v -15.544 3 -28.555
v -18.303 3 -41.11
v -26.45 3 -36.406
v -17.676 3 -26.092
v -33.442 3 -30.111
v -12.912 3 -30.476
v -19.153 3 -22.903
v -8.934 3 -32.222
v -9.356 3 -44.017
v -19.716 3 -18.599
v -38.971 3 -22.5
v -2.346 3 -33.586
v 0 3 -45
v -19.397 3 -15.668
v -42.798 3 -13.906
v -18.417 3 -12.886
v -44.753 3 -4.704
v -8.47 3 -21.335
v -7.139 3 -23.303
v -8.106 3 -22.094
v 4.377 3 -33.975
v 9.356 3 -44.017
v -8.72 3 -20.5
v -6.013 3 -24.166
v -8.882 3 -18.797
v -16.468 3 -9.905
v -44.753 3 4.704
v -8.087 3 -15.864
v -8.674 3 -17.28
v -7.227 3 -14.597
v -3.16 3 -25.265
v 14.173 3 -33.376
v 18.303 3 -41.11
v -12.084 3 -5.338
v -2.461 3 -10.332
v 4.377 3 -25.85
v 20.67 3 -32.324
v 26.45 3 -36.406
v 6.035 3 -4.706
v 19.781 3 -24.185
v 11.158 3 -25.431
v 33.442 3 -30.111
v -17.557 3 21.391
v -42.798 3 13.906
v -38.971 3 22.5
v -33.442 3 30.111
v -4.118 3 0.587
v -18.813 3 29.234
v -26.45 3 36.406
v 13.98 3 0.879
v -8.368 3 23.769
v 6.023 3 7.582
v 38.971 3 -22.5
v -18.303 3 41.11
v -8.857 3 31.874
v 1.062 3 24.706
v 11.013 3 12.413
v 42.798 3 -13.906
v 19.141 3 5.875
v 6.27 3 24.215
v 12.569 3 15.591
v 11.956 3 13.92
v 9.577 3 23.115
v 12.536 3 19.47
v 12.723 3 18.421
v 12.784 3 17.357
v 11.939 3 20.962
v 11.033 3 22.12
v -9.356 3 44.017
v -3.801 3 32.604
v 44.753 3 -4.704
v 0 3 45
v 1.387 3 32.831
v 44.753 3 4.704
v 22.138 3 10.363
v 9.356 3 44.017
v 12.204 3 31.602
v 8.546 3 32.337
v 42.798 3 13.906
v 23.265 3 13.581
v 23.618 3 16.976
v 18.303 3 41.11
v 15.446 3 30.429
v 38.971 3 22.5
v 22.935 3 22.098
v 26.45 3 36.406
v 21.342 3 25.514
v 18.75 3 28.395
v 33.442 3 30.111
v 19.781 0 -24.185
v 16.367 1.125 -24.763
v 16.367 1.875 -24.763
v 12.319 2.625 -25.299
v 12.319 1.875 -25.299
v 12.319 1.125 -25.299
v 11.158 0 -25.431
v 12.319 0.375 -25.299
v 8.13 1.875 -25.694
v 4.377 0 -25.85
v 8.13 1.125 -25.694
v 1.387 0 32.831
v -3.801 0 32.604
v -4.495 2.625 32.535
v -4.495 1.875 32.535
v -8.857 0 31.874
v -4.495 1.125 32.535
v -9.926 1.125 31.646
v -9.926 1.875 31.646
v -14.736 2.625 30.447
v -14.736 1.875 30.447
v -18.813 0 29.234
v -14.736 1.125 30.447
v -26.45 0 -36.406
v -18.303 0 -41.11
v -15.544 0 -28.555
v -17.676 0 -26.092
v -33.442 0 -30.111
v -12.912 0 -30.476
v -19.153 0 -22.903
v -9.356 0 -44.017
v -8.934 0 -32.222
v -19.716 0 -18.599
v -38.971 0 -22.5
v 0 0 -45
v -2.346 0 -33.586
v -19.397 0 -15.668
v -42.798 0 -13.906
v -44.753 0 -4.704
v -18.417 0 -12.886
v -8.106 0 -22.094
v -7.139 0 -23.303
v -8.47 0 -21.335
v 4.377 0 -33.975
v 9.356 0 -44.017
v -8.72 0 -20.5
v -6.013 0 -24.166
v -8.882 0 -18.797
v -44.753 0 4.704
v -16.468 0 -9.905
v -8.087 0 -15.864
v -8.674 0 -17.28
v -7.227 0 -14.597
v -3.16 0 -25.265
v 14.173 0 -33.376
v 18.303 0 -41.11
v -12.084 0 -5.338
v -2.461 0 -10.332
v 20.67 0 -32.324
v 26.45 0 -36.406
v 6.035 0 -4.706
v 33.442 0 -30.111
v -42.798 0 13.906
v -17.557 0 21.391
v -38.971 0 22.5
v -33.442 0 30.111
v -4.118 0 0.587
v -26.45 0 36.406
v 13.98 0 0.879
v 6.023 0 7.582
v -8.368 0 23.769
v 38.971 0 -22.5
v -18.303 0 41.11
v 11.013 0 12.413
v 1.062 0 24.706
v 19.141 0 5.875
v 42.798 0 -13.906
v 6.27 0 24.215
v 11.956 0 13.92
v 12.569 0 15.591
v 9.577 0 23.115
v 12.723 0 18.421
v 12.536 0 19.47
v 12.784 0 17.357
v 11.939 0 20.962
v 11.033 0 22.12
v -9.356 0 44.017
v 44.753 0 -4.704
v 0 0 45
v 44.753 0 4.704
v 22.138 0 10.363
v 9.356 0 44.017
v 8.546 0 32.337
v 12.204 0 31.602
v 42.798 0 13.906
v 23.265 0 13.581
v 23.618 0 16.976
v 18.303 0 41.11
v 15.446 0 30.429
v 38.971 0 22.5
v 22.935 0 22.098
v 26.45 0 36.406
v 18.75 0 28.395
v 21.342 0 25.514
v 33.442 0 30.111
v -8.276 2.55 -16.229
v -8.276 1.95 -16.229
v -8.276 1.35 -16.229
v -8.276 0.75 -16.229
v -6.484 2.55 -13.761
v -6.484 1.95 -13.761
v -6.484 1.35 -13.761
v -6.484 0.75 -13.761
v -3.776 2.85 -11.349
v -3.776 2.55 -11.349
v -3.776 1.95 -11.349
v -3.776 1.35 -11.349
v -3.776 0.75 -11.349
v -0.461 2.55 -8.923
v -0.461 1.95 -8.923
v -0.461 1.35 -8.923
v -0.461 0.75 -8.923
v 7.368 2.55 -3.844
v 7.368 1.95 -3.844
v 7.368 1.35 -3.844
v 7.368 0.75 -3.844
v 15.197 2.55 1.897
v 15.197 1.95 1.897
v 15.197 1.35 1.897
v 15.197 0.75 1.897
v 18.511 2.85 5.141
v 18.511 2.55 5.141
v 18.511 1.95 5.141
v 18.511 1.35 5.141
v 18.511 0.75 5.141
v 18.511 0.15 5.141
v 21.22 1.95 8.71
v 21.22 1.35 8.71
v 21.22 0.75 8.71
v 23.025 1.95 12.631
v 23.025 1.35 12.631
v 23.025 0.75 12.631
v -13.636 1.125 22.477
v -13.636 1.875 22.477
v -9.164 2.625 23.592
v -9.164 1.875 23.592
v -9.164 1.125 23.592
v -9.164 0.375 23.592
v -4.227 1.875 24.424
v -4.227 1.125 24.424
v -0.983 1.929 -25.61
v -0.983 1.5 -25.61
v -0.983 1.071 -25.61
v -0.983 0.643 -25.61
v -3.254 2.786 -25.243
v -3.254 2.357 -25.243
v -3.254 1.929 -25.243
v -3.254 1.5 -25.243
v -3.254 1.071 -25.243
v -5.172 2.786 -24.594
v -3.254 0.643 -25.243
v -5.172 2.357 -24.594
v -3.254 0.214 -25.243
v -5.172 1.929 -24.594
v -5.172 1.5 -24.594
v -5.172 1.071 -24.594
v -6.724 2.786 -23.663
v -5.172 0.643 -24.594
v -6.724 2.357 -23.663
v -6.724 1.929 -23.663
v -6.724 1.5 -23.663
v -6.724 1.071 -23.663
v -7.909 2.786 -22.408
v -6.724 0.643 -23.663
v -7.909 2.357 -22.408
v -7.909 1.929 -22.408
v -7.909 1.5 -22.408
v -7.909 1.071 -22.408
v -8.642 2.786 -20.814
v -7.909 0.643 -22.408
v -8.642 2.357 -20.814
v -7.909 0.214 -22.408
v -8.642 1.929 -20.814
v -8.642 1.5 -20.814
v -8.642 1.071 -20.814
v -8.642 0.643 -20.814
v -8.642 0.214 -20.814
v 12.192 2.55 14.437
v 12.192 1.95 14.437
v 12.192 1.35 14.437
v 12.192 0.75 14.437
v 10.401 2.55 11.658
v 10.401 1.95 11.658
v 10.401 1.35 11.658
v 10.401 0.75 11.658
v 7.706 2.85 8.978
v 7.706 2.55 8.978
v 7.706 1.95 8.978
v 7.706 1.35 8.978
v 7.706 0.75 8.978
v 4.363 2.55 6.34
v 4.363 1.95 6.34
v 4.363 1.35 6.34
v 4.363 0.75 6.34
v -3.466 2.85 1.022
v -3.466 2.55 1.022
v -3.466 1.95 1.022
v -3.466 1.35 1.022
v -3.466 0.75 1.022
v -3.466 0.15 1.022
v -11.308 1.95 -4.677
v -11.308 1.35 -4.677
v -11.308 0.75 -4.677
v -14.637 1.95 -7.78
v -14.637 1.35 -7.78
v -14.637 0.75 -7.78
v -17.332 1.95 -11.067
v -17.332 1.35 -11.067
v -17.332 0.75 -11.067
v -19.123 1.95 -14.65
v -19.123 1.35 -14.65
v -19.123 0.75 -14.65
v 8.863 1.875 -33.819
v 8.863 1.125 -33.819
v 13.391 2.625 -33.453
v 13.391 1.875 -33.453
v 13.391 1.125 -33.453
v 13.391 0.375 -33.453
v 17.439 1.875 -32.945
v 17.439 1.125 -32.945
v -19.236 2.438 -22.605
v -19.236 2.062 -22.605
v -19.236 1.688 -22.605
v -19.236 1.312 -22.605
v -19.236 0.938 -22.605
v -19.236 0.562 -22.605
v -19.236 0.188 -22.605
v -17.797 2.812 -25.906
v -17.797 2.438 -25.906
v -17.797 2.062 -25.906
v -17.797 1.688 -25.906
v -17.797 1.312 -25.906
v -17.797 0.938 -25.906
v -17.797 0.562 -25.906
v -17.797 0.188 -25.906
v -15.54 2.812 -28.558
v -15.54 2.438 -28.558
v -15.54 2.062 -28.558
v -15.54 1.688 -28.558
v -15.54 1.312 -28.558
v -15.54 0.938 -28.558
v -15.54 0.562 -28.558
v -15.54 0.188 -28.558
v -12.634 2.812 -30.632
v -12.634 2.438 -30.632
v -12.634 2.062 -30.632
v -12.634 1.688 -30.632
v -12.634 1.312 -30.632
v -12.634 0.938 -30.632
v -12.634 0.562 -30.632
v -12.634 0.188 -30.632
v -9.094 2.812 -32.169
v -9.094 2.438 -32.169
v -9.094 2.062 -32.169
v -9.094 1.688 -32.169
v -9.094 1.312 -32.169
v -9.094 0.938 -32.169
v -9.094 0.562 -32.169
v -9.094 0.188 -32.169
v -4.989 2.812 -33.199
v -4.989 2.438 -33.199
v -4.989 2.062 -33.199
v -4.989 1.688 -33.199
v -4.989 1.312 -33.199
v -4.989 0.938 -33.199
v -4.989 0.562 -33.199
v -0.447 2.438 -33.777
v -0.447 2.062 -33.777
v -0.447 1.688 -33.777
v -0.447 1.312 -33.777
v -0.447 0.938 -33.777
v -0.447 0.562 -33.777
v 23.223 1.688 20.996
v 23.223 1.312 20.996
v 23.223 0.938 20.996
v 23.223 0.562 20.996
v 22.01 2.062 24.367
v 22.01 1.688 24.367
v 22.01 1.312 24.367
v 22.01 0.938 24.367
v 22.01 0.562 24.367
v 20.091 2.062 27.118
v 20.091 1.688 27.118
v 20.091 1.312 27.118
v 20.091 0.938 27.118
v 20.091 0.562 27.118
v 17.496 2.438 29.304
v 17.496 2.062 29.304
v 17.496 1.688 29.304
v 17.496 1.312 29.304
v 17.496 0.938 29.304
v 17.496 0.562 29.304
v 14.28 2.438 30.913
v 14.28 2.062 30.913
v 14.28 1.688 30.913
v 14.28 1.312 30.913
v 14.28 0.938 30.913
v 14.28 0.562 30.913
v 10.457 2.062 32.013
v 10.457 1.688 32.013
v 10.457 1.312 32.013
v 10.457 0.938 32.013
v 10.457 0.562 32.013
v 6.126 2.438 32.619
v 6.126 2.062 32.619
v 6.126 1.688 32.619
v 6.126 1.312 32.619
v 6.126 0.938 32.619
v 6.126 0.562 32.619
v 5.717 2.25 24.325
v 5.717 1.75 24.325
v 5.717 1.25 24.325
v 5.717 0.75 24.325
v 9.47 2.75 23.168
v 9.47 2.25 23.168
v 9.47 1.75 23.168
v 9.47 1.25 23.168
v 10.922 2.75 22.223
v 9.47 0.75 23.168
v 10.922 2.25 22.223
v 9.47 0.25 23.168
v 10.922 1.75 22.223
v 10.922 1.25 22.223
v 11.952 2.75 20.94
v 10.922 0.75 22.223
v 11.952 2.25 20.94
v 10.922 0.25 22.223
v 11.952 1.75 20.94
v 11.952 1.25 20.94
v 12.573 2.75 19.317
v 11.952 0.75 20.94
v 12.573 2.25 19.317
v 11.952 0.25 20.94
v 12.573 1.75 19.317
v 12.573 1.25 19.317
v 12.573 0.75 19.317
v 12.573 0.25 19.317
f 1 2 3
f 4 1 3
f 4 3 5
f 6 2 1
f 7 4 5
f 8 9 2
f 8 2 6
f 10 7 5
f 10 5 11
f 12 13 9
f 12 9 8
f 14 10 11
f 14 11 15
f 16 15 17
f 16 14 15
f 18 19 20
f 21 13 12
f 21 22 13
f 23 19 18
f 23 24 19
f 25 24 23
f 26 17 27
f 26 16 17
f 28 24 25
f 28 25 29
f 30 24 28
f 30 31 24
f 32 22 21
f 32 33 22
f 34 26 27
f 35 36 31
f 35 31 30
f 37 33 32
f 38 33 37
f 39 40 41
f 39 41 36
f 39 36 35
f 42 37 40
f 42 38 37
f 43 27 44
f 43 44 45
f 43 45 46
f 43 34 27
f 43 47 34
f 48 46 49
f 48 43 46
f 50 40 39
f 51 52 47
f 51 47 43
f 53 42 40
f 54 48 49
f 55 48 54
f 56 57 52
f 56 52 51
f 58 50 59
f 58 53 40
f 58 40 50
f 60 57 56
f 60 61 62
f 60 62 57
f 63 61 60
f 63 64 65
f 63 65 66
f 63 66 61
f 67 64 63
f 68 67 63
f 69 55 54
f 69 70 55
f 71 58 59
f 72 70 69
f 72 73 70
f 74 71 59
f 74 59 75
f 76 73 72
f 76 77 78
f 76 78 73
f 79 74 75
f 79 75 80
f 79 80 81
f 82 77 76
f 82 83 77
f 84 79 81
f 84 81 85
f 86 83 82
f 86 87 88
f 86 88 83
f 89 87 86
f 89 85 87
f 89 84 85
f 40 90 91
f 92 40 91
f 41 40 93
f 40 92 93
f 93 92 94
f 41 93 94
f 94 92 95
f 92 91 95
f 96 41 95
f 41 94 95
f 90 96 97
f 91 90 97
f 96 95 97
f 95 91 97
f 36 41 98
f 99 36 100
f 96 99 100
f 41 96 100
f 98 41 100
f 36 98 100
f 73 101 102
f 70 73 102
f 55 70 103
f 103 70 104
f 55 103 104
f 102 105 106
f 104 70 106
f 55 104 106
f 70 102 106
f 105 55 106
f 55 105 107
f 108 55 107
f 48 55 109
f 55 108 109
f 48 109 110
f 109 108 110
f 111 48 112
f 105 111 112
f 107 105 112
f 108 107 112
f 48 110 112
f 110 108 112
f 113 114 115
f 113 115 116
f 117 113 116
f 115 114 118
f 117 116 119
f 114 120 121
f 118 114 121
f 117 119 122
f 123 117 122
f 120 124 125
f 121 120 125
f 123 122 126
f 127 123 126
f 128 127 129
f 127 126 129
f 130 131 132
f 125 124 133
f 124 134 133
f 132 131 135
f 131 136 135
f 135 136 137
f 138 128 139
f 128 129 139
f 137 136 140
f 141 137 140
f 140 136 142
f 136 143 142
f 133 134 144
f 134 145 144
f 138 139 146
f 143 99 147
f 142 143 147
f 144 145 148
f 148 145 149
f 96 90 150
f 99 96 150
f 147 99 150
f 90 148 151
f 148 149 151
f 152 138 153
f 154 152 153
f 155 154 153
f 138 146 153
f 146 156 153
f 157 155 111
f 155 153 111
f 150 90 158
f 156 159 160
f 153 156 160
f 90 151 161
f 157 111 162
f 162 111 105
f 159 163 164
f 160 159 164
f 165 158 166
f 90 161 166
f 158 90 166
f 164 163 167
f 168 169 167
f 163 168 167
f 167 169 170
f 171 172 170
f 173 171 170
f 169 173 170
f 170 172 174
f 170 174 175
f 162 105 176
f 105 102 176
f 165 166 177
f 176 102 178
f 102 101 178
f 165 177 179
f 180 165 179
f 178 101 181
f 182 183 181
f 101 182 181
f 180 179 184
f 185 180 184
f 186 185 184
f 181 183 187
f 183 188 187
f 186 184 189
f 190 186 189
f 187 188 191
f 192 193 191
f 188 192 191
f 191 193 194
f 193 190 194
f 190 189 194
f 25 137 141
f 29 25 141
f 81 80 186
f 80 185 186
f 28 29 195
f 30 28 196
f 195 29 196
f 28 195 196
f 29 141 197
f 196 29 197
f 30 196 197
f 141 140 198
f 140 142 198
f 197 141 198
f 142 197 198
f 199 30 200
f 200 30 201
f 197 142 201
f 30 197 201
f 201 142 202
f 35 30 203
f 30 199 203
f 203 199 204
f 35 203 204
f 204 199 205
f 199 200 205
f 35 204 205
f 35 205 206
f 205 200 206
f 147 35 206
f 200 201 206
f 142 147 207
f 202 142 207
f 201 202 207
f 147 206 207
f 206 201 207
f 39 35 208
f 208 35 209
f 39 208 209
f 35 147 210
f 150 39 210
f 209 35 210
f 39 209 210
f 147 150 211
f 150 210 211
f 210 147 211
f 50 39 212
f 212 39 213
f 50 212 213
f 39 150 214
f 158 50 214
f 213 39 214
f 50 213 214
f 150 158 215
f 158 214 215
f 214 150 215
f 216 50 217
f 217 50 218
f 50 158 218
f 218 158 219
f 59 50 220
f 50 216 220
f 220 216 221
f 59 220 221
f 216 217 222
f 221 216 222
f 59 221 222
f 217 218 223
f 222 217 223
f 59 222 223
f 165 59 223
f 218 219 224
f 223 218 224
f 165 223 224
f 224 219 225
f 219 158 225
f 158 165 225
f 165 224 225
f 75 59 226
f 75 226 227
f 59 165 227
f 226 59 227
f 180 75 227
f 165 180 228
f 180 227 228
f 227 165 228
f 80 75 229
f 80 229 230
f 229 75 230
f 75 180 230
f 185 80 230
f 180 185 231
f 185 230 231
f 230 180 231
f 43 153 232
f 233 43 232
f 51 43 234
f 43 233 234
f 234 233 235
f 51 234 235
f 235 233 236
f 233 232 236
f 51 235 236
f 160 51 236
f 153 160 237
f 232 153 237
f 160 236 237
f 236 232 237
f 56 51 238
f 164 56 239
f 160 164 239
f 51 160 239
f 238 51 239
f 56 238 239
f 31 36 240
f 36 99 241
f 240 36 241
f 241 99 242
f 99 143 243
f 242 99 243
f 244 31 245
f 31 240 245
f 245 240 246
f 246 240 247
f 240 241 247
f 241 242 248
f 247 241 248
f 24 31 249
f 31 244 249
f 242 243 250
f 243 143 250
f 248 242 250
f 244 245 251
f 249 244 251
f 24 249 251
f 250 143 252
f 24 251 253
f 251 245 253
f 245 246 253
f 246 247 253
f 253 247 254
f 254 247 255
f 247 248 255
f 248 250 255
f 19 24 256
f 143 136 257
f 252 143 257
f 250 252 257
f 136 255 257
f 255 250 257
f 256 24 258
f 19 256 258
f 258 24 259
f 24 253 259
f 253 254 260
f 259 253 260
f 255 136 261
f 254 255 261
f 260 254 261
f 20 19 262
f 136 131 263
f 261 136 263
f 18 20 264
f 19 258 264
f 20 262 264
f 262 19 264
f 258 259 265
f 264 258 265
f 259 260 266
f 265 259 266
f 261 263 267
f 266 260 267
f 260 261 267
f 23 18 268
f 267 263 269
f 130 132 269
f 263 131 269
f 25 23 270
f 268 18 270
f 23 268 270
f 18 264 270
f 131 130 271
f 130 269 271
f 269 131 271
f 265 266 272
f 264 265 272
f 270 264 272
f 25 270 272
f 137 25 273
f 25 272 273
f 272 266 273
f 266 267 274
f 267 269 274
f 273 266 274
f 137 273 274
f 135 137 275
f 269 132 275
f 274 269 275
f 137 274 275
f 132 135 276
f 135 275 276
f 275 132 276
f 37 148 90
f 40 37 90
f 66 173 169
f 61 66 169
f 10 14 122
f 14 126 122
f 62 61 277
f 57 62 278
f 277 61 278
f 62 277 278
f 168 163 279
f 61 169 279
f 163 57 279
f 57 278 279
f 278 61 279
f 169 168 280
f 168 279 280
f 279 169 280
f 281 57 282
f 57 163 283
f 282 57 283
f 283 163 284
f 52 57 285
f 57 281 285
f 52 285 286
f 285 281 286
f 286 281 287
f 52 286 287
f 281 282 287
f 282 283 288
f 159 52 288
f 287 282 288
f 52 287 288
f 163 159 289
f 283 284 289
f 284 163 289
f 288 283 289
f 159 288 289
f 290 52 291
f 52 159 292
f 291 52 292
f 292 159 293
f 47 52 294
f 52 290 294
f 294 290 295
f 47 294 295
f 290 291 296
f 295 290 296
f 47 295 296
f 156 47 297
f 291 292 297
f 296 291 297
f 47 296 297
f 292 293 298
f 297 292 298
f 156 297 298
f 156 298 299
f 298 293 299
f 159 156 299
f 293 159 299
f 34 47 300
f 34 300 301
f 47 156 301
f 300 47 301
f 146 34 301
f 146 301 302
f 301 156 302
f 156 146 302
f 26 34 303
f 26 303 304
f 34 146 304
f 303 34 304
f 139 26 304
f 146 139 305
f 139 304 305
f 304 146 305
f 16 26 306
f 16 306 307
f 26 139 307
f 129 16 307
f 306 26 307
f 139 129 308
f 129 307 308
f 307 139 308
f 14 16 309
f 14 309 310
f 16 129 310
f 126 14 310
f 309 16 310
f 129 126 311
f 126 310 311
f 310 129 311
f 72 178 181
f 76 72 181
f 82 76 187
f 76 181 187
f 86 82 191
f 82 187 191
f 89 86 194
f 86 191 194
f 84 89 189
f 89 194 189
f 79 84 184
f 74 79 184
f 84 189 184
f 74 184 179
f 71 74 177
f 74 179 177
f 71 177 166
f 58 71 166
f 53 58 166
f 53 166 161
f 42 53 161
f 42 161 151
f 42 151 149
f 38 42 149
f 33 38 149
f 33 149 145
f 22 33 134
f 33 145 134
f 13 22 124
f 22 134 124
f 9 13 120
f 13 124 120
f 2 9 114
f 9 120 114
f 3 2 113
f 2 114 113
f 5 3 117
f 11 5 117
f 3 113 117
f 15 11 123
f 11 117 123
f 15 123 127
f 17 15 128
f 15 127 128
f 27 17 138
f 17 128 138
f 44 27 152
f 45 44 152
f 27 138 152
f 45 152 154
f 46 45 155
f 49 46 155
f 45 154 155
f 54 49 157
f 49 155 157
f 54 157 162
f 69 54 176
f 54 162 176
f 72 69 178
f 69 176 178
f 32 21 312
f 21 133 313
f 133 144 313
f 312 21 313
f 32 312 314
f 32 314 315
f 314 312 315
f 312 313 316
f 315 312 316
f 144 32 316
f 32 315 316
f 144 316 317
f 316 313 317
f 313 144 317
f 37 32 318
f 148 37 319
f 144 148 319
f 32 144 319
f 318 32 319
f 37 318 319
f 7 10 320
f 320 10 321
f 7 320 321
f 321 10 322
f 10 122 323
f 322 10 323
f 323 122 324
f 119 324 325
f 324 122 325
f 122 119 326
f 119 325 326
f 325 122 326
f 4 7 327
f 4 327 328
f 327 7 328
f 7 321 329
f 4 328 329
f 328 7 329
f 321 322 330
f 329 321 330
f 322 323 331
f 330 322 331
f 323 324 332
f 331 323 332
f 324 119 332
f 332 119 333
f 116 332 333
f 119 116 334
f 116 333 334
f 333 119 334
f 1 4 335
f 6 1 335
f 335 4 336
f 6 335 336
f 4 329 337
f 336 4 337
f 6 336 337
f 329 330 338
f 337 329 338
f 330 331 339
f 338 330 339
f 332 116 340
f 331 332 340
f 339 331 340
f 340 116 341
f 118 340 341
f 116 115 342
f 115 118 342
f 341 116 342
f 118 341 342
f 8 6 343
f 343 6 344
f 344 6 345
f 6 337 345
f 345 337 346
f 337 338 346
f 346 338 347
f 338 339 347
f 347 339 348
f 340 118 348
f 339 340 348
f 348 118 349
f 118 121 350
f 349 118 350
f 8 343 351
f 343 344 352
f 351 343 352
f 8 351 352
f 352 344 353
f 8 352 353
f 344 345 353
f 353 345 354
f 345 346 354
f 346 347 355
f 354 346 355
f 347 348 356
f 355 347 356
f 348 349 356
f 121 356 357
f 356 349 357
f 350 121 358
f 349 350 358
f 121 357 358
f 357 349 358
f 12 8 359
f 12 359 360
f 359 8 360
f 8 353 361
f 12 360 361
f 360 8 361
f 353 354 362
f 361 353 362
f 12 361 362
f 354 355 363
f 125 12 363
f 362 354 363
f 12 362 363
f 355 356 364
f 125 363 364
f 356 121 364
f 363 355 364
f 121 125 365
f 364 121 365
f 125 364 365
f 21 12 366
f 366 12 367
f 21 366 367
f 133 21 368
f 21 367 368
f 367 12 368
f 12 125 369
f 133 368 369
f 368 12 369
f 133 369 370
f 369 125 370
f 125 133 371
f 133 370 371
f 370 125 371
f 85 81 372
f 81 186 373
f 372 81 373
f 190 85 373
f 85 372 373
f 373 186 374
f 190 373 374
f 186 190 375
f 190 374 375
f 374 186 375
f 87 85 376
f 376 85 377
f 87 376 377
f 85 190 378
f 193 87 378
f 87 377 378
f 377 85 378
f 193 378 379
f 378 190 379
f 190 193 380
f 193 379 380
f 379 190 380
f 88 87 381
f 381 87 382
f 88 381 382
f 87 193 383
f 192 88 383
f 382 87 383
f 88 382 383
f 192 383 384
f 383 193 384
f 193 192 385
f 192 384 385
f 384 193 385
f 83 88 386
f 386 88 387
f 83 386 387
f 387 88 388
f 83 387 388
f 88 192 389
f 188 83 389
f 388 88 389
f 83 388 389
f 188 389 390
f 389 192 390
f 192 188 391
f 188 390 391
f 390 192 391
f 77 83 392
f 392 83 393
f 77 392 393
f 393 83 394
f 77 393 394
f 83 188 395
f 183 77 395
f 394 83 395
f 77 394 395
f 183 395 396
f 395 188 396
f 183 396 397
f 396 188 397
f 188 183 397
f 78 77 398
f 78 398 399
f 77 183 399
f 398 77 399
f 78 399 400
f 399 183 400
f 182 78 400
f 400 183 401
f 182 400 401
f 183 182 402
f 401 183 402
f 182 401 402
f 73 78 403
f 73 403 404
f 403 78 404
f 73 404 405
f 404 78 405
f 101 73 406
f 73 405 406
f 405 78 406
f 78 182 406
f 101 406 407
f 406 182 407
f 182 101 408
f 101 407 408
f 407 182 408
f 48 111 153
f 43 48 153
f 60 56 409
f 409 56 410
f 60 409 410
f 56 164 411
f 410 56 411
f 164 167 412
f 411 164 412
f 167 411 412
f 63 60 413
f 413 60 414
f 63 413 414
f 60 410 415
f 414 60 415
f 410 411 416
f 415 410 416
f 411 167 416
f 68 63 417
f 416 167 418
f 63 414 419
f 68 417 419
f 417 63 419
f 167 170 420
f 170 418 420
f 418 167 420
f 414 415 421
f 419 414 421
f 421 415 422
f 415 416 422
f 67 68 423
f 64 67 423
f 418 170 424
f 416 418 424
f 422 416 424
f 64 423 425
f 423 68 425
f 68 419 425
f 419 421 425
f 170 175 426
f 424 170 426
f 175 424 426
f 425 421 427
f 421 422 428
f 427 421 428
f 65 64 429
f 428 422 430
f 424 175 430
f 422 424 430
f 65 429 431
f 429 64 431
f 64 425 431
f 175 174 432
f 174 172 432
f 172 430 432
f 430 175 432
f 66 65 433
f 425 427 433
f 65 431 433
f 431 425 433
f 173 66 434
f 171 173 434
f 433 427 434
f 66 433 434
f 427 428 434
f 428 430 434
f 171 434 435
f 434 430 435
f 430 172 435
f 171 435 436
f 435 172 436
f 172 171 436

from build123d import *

# Parameters (mm, degrees)
SKETCH1_R           = 45
BOSS_EXTRUDE1_DEPTH = 3


with BuildPart() as part:
    # Sketch1 → Boss-Extrude1 (new body)
    with BuildSketch(Plane(origin=(0, 0, 0), x_dir=(1, 0, 0), z_dir=(0, 1, 0))):
        with Locations(Location((0, 0, 0), (0, 0, 270))):  # turned: the seam where the file's is
            Circle(SKETCH1_R)
        with BuildLine():
            add(Edge.make_bspline(
                [(19.780990946, 24.185124764), (19.255065107, 24.287914798), (18.122086305, 24.509350826), (16.316551627, 24.770179957), (14.357752418, 25.057330128), (12.311058297, 25.302832973), (10.229567608, 25.537930243), (8.173301101, 25.696077882), (6.221913509, 25.819266557), (4.969956895, 25.839869106), (4.377345112, 25.849621292)],
                knots=[0, 0, 0, 0, 0.829036243, 1.785956155, 2.822045536, 3.89228551, 4.975307857, 6.062841547, 7.083048955, 8, 8, 8, 8], degree=3))
            add(Edge.make_bspline(
                [(4.377345112, 25.849621292), (3.446204146, 25.839565028), (1.65716034, 25.820243466), (-0.523497459, 25.678422406), (-2.134814502, 25.466621363), (-3.234258723, 25.269743374), (-4.239722547, 24.96405185), (-5.163089497, 24.614993657), (-6.002431575, 24.201660489), (-6.733506828, 23.675895663), (-7.383141898, 23.092997796), (-7.930081052, 22.419543279), (-8.359935091, 21.657367799), (-8.673790899, 20.796588784), (-8.856015855, 19.829357364), (-8.873240581, 19.150114951), (-8.882203499, 18.796669903)],
                knots=[0, 0, 0, 0, 2.295489194, 4.410428573, 5.380894891, 6.301560079, 7.159764947, 7.966985716, 8.734184816, 9.457764993, 10.179765198, 10.880326743, 11.586237622, 12.32697511, 13.129438398, 14, 14, 14, 14], degree=3))
            add(Edge.make_bspline(
                [(-8.882203499, 18.796669903), (-8.850818027, 18.360202528), (-8.787076829, 17.473774773), (-8.299529285, 16.177773231), (-7.531705877, 14.918174723), (-6.468835972, 13.707430879), (-5.199588079, 12.505820488), (-3.750460779, 11.316874284), (-2.173501164, 10.095772106), (0.19047217, 8.465461016), (3.392591141, 6.389097084), (7.401158074, 3.84423487), (11.436980484, 1.154437496), (14.598547163, -1.337138932), (16.941188197, -3.441782617), (18.524295541, -5.116615111), (19.962389169, -6.861115679), (21.249269366, -8.677300905), (22.30079899, -10.59536019), (23.087128729, -12.62347507), (23.521482235, -14.771077168), (23.585470219, -16.235887567), (23.617796501, -16.975899541)],
                knots=[0, 0, 0, 0, 0.519213468, 1.054477964, 1.630134935, 2.270161266, 2.967727746, 3.71175636, 4.503051278, 5.34407491, 7.13300234, 9.051150551, 11.003302341, 12.910294161, 13.842483047, 14.754150315, 15.653890787, 16.535313878, 17.40293064, 18.254252337, 19.118060482, 20, 20, 20, 20], degree=3))
            add(Edge.make_bspline(
                [(23.617796501, -16.975899541), (23.599786365, -17.672825423), (23.564928796, -19.021684862), (23.270802134, -20.965503255), (22.762650283, -22.748577872), (22.050483541, -24.36572214), (21.174041496, -25.835244154), (20.110888209, -27.14506), (18.897414426, -28.327096204), (17.50009469, -29.336609406), (15.962883146, -30.226180167), (14.258614821, -30.943249705), (12.420117395, -31.575353637), (10.428945987, -32.043245685), (8.315670511, -32.386430983), (6.098422851, -32.63922249), (3.77777338, -32.797342644), (2.195888092, -32.819567974), (1.386893723, -32.830934264)],
                knots=[0, 0, 0, 0, 1.075194104, 2.080975546, 3.024934148, 3.928271024, 4.800677613, 5.657461563, 6.524782954, 7.407242198, 8.310928775, 9.259978089, 10.255920614, 11.308444205, 12.411965724, 13.558733007, 14.751507922, 16, 16, 16, 16], degree=3))
            add(Edge.make_bspline(
                [(1.386893723, -32.830934264), (0.384854835, -32.819567929), (-1.579565413, -32.797285102), (-4.469689043, -32.557780783), (-7.246791058, -32.207577643), (-9.885005378, -31.670272649), (-12.368606742, -31.076733402), (-14.681000089, -30.469055859), (-16.813387105, -29.868409154), (-18.164915503, -29.439515535), (-18.812759054, -29.233929055)],
                knots=[0, 0, 0, 0, 1.166641361, 2.287110747, 3.375174177, 4.42434953, 5.420457035, 6.34882319, 7.208522552, 8, 8, 8, 8], degree=3))
            Line((-18.812759054, -29.233929055), (-17.557333707, -21.391047111))
            add(Edge.make_bspline(
                [(-17.557333707, -21.391047111), (-16.92765023, -21.571066227), (-15.623509008, -21.943904896), (-13.597987784, -22.494044975), (-11.428021788, -23.040422446), (-9.137280734, -23.613361679), (-6.72469763, -24.121615317), (-4.205720245, -24.443757714), (-1.60294269, -24.668864111), (0.163871673, -24.693436806), (1.062457959, -24.705934264)],
                knots=[0, 0, 0, 0, 0.82784923, 1.714563499, 2.653014331, 3.656340952, 4.699592855, 5.767128945, 6.864381369, 8, 8, 8, 8], degree=3))
            add(Edge.make_bspline(
                [(1.062457959, -24.705934264), (1.876650637, -24.687246807), (3.435097114, -24.651477141), (5.663708681, -24.375253087), (7.66548934, -23.896733066), (9.185584763, -23.345151534), (10.24171498, -22.753709402), (10.937316717, -22.248785046), (11.499265321, -21.629257743), (11.979043163, -20.941428467), (12.342776891, -20.163357249), (12.596885499, -19.297650342), (12.751136892, -18.354355508), (12.773133718, -17.695897336), (12.784463168, -17.356758916)],
                knots=[0, 0, 0, 0, 1.865164993, 3.57011294, 5.132569067, 6.57499646, 7.255114939, 7.901464084, 8.534112646, 9.161604161, 9.81695743, 10.491765748, 11.223185006, 12, 12, 12, 12], degree=3))
            add(Edge.make_bspline(
                [(12.784463168, -17.356758916), (12.752373418, -16.859917427), (12.687880197, -15.861377146), (12.224204459, -14.388468451), (11.462465357, -12.964292087), (10.390925154, -11.60553121), (9.124414869, -10.267841999), (7.686118718, -8.936597872), (6.095227969, -7.612559939), (3.717571546, -5.85406476), (0.52885577, -3.635742908), (-3.489713573, -1.025376634), (-7.505368863, 1.697395276), (-10.696639338, 4.119771578), (-13.043162038, 6.168454152), (-14.637770832, 7.740654265), (-16.064077212, 9.372166101), (-17.348452609, 11.025867113), (-18.42180964, 12.766347784), (-19.168862671, 14.625642809), (-19.624536603, 16.58376369), (-19.684854205, 17.919645128), (-19.715536832, 18.599187264)],
                knots=[0, 0, 0, 0, 0.591380666, 1.188542884, 1.822507787, 2.505918877, 3.243027329, 4.015898054, 4.839248524, 5.707487546, 7.538026587, 9.466039613, 11.415971731, 13.317280673, 14.234172866, 15.125381555, 15.982728632, 16.814024653, 17.618094752, 18.409678073, 19.191027939, 20, 20, 20, 20], degree=3))
            add(Edge.make_bspline(
                [(-19.715536832, 18.599187264), (-19.69007572, 19.296431103), (-19.640869758, 20.643919536), (-19.294531368, 22.582084159), (-18.679144546, 24.338232741), (-17.842869563, 25.923663704), (-16.779110741, 27.326321286), (-15.558622534, 28.586881396), (-14.182283058, 29.714351392), (-12.623789919, 30.673268851), (-10.917968821, 31.496846545), (-9.069476595, 32.208414475), (-7.081002803, 32.779480609), (-4.958515074, 33.227140213), (-2.733752509, 33.556420942), (-0.422428367, 33.79150112), (1.95338712, 33.958539874), (3.563608319, 33.969222666), (4.377345112, 33.974621292)],
                knots=[0, 0, 0, 0, 1.03838471, 2.006774832, 2.919286264, 3.799627568, 4.665221273, 5.531947435, 6.40804449, 7.307755042, 8.250508454, 9.225938019, 10.254284747, 11.328399385, 12.454517948, 13.602227205, 14.788268378, 16, 16, 16, 16], degree=3))
            add(Edge.make_bspline(
                [(4.377345112, 33.974621292), (5.110989126, 33.965254351), (6.607281613, 33.946150149), (8.869481458, 33.827722709), (11.14014177, 33.657276118), (13.354931043, 33.460072759), (15.4510663, 33.250532473), (17.378136504, 32.963398675), (19.099276185, 32.65905252), (20.171790498, 32.430381936), (20.669662821, 32.324230667)],
                knots=[0, 0, 0, 0, 1.073469456, 2.189378298, 3.313843796, 4.405133658, 5.442979297, 6.395522168, 7.255184668, 8, 8, 8, 8], degree=3))
            Line((20.669662821, 32.324230667), (19.780990946, 24.185124764))
        make_face(mode=Mode.SUBTRACT)
    extrude(amount=BOSS_EXTRUDE1_DEPTH)


solid = part.part
